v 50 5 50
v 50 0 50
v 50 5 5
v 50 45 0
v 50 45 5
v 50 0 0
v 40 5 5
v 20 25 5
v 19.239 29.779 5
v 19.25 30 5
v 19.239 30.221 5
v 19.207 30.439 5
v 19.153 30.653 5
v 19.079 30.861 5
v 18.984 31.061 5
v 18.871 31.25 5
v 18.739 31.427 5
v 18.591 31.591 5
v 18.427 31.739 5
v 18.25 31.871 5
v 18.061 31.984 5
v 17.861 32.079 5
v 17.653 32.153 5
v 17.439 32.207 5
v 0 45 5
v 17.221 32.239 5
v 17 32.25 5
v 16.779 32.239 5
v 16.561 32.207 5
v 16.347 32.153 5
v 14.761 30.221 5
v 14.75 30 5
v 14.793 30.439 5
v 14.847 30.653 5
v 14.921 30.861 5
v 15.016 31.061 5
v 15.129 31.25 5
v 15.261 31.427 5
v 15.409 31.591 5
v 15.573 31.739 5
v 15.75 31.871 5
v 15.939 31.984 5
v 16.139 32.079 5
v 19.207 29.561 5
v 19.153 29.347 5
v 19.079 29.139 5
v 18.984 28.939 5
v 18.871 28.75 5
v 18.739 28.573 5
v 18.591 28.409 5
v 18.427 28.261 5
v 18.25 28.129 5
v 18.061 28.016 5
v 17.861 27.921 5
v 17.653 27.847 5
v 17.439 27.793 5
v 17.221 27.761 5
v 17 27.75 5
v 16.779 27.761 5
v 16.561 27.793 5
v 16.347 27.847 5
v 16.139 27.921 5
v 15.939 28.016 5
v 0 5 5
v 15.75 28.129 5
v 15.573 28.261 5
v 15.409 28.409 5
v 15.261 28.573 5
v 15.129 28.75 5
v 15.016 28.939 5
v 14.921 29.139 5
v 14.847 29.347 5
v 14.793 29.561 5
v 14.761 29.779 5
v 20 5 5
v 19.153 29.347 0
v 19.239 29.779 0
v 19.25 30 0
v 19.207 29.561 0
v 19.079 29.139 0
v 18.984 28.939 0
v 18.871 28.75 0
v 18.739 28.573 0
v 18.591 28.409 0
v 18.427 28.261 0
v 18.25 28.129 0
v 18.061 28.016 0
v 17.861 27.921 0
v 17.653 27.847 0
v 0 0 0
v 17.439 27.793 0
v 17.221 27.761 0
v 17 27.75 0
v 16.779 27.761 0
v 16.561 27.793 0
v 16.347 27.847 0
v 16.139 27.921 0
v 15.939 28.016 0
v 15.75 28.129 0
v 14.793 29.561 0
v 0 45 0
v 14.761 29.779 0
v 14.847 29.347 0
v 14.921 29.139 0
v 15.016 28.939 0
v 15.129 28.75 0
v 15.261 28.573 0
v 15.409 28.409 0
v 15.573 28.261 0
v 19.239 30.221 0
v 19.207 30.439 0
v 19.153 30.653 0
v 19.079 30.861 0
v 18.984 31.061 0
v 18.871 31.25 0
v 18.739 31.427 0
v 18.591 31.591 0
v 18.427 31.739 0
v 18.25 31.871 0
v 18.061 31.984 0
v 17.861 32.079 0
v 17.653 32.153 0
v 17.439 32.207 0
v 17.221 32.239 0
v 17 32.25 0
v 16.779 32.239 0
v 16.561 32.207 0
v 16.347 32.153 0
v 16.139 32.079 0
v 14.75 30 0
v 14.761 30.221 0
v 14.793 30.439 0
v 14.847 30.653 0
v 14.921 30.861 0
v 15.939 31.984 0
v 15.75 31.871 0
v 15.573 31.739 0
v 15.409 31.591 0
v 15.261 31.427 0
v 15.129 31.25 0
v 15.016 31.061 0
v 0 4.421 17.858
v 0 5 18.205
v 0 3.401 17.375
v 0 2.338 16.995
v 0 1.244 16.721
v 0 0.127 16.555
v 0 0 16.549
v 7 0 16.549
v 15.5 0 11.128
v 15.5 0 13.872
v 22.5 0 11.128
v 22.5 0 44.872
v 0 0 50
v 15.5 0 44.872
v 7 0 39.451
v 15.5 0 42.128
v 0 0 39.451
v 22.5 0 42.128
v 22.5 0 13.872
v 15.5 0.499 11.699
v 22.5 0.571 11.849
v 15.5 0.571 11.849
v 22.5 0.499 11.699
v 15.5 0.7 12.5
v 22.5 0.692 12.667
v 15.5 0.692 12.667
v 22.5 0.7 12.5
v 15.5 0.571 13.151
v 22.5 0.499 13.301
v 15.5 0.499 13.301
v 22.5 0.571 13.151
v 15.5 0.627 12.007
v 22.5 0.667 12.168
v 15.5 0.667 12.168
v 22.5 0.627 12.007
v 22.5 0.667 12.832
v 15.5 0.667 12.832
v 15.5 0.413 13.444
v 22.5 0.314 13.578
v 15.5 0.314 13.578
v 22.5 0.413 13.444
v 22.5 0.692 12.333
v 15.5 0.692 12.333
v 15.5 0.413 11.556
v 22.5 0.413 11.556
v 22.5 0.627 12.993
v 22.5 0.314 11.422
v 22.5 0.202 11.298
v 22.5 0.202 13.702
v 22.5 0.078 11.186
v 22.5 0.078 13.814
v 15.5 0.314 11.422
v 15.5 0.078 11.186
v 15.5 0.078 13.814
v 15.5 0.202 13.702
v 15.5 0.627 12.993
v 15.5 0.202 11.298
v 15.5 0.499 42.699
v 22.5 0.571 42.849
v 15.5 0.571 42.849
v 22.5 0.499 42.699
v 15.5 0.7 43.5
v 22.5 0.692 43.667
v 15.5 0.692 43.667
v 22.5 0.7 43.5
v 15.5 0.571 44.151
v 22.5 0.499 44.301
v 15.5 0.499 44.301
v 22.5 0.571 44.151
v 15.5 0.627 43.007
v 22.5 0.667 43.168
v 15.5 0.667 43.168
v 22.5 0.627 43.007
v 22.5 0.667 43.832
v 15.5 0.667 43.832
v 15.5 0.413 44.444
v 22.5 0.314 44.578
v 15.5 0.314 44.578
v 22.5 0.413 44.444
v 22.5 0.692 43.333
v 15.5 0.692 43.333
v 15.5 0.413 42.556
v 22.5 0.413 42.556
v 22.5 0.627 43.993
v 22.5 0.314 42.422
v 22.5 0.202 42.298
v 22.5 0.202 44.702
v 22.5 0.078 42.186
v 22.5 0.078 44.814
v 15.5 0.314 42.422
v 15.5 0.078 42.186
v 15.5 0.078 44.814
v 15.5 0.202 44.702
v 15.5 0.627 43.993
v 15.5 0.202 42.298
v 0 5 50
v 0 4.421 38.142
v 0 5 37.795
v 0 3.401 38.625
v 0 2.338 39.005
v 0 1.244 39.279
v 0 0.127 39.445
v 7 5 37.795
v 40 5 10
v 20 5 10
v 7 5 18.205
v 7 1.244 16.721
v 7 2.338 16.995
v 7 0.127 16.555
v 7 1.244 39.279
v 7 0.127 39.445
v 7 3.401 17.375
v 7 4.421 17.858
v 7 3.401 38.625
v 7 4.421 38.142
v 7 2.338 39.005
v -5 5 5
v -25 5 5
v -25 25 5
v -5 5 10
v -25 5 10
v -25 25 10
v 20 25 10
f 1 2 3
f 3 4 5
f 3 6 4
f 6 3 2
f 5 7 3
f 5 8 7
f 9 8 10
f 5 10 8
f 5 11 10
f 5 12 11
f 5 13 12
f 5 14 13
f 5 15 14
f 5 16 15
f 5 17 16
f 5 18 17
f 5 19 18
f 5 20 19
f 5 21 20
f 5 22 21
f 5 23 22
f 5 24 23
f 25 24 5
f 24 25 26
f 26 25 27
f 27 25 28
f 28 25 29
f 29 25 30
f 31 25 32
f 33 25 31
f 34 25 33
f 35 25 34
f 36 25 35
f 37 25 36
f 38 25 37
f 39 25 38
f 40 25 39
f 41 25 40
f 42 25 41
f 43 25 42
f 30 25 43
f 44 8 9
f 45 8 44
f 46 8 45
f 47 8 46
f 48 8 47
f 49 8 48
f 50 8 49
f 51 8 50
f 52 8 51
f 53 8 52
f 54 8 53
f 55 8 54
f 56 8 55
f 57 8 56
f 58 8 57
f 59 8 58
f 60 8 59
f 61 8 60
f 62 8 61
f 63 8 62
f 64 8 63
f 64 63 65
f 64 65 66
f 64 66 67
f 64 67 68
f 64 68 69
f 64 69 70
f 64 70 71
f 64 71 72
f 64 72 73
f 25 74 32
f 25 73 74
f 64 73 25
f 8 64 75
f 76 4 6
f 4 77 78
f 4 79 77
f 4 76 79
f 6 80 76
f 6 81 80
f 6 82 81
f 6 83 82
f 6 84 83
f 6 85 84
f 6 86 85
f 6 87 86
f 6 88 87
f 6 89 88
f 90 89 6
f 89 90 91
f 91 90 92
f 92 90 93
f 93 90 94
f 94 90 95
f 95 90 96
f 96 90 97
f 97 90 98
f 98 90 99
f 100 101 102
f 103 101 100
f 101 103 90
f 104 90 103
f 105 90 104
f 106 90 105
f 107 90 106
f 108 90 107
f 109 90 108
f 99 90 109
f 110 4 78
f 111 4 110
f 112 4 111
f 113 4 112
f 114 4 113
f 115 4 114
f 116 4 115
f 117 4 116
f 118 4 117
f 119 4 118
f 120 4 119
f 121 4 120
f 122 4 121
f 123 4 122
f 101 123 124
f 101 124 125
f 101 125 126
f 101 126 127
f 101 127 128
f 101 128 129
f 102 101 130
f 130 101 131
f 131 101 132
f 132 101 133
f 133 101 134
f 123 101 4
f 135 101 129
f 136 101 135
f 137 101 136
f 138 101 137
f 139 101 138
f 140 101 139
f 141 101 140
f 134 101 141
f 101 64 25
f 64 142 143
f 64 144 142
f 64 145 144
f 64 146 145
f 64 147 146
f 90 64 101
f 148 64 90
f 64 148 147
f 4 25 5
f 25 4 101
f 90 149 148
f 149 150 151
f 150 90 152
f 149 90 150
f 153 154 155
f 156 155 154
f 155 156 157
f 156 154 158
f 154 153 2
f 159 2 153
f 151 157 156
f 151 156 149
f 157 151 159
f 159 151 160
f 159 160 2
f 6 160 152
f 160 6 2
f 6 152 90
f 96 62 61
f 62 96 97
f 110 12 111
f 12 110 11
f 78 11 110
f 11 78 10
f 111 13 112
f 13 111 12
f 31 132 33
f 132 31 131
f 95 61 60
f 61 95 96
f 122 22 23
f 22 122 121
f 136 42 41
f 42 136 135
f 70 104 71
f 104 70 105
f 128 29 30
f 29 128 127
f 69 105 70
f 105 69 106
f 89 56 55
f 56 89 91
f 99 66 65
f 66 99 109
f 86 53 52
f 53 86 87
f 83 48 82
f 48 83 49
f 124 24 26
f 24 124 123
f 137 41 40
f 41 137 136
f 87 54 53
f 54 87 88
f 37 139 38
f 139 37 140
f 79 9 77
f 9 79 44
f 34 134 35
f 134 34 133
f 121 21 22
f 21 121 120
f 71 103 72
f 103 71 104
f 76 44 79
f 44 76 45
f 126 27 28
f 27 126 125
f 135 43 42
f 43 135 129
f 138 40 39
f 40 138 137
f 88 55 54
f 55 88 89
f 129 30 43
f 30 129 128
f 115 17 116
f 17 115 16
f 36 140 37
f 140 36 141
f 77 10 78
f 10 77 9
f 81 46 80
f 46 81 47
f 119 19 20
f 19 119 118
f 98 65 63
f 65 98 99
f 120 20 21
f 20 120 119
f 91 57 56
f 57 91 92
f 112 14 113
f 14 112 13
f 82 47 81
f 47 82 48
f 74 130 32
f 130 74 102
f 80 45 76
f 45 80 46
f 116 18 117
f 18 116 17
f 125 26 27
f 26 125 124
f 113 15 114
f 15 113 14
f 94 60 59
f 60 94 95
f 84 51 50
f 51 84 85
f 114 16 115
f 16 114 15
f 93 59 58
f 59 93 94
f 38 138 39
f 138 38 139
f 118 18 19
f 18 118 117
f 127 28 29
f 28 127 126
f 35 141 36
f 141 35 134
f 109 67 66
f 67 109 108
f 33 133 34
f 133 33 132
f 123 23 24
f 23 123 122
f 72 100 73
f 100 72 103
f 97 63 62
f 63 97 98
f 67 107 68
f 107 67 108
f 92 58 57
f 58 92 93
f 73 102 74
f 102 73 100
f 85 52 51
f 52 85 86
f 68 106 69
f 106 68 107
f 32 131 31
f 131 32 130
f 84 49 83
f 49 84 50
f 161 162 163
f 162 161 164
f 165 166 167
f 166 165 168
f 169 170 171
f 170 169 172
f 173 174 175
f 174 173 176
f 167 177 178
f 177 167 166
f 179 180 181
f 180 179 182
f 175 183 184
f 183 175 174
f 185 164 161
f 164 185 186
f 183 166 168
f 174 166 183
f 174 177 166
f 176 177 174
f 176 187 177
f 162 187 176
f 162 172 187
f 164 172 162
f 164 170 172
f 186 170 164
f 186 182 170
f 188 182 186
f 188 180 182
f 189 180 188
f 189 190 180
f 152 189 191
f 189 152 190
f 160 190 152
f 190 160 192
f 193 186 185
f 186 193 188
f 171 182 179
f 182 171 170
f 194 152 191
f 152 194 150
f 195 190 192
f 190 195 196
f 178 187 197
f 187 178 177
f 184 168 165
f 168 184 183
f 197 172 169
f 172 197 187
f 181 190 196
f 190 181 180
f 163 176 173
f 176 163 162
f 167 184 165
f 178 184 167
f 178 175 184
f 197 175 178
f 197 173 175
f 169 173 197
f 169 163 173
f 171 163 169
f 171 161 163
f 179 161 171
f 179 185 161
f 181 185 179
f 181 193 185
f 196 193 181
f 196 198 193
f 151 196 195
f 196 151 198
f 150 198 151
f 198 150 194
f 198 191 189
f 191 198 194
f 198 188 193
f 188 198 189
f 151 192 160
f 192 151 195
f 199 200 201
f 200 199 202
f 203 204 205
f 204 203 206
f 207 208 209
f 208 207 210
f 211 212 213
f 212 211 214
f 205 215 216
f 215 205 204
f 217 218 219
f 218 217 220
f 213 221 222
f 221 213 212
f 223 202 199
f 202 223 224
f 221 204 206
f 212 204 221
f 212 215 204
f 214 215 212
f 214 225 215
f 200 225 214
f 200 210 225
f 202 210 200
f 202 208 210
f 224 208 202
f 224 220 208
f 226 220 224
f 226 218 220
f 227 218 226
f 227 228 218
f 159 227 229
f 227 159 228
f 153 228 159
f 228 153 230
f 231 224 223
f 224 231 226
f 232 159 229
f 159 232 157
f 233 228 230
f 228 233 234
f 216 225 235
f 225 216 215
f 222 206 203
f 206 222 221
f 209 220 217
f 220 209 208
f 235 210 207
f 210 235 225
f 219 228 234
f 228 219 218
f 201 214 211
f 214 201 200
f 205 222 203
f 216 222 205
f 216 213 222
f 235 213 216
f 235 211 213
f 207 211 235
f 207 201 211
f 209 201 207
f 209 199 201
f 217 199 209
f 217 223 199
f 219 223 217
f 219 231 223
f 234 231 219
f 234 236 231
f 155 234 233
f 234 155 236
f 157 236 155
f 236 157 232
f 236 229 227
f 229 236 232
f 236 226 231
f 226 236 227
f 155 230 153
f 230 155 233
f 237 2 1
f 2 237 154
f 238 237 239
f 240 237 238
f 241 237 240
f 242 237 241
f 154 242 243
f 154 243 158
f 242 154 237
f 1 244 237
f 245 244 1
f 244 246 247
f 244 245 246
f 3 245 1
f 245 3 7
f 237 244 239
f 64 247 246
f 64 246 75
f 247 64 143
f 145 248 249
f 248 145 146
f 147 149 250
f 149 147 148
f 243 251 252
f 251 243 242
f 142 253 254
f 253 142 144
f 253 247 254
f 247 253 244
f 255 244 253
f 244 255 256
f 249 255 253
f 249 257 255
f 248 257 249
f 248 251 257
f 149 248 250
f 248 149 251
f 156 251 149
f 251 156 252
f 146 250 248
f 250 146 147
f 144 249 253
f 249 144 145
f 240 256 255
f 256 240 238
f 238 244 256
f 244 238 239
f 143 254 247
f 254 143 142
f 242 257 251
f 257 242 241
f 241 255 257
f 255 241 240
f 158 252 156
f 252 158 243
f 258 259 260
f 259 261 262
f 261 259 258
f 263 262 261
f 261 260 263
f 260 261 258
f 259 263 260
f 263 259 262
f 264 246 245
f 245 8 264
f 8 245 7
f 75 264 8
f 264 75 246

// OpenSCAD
// NEMA 17 Stepper Motor L-Bracket for Syringe Pump
// Designed for FDM 3D Printing

// --- Dimensions ---
// Base Plate
base_x_min = -25;
base_x_max = 25;
base_y_min = 0;
base_y_max = 45;
base_z_height = 5;

// Base Plate Holes (M4)
m4_hole_dia = 4.5;
m4_hole_x1 = -17;
m4_hole_x2 = 17;
m4_hole_y = 30;

// Vertical Motor Plate
motor_plate_x_min = -25;
motor_plate_x_max = 25;
motor_plate_y_max = 5;
motor_plate_z_max = 50;

// Motor Boss Hole (Centering)
boss_hole_dia = 23;
boss_hole_x = 0;
boss_hole_z = 28;

// Motor Screw Holes (M3)
m3_hole_dia = 3.4;
m3_pattern_size = 31;
m3_offset = m3_pattern_size / 2;

// Gussets
gusset_thickness = 5;
gusset_leg_y = 20;
gusset_leg_z = 20;
gusset_x_left = -25;
gusset_x_right = 25;

// Resolution
$fn = 64;

// --- Construction ---

module base_plate() {
    difference() {
        // Main Base Body
        cube([base_x_max - base_x_min, base_y_max - base_y_min, base_z_height]);
        
        // M4 Holes (Vertical through-holes)
        // We translate to the center of the base plate's local coordinate system
        // Base is centered on X, but Y starts at 0.
        translate([m4_hole_x1, m4_hole_y, -1])
            cylinder(d = m4_hole_dia, h = base_z_height + 2);
        translate([m4_hole_x2, m4_hole_y, -1])
            cylinder(d = m4_hole_dia, h = base_z_height + 2);
    }
}

module motor_plate() {
    difference() {
        // Main Vertical Plate Body
        cube([motor_plate_x_max - motor_plate_x_min, motor_plate_y_max, motor_plate_z_max]);
        
        // Motor Centering Boss Hole (Cylinder along Y axis)
        translate([boss_hole_x, -1, boss_hole_z])
            rotate([0, 90, 0])
            cylinder(d = boss_hole_dia, h = motor_plate_y_max + 2);
            
        // M3 Screw Holes (4 holes in a square pattern)
        // Pattern is centered on the boss hole
        for (px = [-m3_offset, m3_offset]) {
            for (pz = [-m3_offset, m3_offset]) {
                translate([px, -1, boss_hole_z + pz])
                    rotate([0, 90, 0])
                    cylinder(d = m3_hole_dia, h = motor_plate_y_max + 2);
            }
        }
    }
}

module gusset(x_pos) {
    // A right triangle in YZ plane
    // Legs: 20mm along Y, 20mm along Z
    // Right angle corner at y=5, z=5 (relative to global, but plate is at y=0 to 5)
    // The user says "flush with edges" and "right angle corner at y=5, z=5"
    // Since the plate is at y=0 to 5, the gusset starts at the junction.
    
    translate([x_pos, 5, 5])
    rotate([0, 0, 0]) // Orientation check
    linear_extrude(height = gusset_thickness)
    polygon(points=[
        [0, 0],
        [gusset_leg_y, 0],
        [0, gusset_leg_z]
    ]);
}

// --- Final Assembly ---

union() {
    // 1. Base Plate
    // Translate to center on X, but Y starts at 0
    translate([0, 0, 0])
    base_plate();

    // 2. Vertical Motor Plate
    // Positioned at the back edge (y=0 to 5)
    translate([0, 0, 0])
    motor_plate();

    // 3. Gussets
    // Left Gusset (x from -25 to -20)
    // We use the thickness to define the width in X
    // The gusset is placed at the edge.
    // Left: x = -25 to -20. Right: x = 20 to 25.
    
    // Left Gusset
    translate([-25, 5, 5])
    linear_extrude(height = gusset_thickness)
    polygon(points=[[0,0], [gusset_leg_y, 0], [0, gusset_leg_z]]);
    
    // Right Gusset
    translate([20, 5, 5])
    linear_extrude(height = gusset_thickness)
    polygon(points=[[0,0], [gusset_leg_y, 0], [0, gusset_leg_z]]);
}

// Note: The gusset logic above uses linear_extrude to create the thickness.
// To ensure they are "flush" with the edges as requested:
// Left edge is at x=-25. Right edge is at x=25.
// The code above places the left gusset at x=-25 and the right at x=20.
// To make them flush with the outer edges:
// Left: translate([-25, 5, 5]) ... thickness 5 -> covers -25 to -20.
// Right: translate([20, 5, 5]) ... thickness 5 -> covers 20 to 25.
